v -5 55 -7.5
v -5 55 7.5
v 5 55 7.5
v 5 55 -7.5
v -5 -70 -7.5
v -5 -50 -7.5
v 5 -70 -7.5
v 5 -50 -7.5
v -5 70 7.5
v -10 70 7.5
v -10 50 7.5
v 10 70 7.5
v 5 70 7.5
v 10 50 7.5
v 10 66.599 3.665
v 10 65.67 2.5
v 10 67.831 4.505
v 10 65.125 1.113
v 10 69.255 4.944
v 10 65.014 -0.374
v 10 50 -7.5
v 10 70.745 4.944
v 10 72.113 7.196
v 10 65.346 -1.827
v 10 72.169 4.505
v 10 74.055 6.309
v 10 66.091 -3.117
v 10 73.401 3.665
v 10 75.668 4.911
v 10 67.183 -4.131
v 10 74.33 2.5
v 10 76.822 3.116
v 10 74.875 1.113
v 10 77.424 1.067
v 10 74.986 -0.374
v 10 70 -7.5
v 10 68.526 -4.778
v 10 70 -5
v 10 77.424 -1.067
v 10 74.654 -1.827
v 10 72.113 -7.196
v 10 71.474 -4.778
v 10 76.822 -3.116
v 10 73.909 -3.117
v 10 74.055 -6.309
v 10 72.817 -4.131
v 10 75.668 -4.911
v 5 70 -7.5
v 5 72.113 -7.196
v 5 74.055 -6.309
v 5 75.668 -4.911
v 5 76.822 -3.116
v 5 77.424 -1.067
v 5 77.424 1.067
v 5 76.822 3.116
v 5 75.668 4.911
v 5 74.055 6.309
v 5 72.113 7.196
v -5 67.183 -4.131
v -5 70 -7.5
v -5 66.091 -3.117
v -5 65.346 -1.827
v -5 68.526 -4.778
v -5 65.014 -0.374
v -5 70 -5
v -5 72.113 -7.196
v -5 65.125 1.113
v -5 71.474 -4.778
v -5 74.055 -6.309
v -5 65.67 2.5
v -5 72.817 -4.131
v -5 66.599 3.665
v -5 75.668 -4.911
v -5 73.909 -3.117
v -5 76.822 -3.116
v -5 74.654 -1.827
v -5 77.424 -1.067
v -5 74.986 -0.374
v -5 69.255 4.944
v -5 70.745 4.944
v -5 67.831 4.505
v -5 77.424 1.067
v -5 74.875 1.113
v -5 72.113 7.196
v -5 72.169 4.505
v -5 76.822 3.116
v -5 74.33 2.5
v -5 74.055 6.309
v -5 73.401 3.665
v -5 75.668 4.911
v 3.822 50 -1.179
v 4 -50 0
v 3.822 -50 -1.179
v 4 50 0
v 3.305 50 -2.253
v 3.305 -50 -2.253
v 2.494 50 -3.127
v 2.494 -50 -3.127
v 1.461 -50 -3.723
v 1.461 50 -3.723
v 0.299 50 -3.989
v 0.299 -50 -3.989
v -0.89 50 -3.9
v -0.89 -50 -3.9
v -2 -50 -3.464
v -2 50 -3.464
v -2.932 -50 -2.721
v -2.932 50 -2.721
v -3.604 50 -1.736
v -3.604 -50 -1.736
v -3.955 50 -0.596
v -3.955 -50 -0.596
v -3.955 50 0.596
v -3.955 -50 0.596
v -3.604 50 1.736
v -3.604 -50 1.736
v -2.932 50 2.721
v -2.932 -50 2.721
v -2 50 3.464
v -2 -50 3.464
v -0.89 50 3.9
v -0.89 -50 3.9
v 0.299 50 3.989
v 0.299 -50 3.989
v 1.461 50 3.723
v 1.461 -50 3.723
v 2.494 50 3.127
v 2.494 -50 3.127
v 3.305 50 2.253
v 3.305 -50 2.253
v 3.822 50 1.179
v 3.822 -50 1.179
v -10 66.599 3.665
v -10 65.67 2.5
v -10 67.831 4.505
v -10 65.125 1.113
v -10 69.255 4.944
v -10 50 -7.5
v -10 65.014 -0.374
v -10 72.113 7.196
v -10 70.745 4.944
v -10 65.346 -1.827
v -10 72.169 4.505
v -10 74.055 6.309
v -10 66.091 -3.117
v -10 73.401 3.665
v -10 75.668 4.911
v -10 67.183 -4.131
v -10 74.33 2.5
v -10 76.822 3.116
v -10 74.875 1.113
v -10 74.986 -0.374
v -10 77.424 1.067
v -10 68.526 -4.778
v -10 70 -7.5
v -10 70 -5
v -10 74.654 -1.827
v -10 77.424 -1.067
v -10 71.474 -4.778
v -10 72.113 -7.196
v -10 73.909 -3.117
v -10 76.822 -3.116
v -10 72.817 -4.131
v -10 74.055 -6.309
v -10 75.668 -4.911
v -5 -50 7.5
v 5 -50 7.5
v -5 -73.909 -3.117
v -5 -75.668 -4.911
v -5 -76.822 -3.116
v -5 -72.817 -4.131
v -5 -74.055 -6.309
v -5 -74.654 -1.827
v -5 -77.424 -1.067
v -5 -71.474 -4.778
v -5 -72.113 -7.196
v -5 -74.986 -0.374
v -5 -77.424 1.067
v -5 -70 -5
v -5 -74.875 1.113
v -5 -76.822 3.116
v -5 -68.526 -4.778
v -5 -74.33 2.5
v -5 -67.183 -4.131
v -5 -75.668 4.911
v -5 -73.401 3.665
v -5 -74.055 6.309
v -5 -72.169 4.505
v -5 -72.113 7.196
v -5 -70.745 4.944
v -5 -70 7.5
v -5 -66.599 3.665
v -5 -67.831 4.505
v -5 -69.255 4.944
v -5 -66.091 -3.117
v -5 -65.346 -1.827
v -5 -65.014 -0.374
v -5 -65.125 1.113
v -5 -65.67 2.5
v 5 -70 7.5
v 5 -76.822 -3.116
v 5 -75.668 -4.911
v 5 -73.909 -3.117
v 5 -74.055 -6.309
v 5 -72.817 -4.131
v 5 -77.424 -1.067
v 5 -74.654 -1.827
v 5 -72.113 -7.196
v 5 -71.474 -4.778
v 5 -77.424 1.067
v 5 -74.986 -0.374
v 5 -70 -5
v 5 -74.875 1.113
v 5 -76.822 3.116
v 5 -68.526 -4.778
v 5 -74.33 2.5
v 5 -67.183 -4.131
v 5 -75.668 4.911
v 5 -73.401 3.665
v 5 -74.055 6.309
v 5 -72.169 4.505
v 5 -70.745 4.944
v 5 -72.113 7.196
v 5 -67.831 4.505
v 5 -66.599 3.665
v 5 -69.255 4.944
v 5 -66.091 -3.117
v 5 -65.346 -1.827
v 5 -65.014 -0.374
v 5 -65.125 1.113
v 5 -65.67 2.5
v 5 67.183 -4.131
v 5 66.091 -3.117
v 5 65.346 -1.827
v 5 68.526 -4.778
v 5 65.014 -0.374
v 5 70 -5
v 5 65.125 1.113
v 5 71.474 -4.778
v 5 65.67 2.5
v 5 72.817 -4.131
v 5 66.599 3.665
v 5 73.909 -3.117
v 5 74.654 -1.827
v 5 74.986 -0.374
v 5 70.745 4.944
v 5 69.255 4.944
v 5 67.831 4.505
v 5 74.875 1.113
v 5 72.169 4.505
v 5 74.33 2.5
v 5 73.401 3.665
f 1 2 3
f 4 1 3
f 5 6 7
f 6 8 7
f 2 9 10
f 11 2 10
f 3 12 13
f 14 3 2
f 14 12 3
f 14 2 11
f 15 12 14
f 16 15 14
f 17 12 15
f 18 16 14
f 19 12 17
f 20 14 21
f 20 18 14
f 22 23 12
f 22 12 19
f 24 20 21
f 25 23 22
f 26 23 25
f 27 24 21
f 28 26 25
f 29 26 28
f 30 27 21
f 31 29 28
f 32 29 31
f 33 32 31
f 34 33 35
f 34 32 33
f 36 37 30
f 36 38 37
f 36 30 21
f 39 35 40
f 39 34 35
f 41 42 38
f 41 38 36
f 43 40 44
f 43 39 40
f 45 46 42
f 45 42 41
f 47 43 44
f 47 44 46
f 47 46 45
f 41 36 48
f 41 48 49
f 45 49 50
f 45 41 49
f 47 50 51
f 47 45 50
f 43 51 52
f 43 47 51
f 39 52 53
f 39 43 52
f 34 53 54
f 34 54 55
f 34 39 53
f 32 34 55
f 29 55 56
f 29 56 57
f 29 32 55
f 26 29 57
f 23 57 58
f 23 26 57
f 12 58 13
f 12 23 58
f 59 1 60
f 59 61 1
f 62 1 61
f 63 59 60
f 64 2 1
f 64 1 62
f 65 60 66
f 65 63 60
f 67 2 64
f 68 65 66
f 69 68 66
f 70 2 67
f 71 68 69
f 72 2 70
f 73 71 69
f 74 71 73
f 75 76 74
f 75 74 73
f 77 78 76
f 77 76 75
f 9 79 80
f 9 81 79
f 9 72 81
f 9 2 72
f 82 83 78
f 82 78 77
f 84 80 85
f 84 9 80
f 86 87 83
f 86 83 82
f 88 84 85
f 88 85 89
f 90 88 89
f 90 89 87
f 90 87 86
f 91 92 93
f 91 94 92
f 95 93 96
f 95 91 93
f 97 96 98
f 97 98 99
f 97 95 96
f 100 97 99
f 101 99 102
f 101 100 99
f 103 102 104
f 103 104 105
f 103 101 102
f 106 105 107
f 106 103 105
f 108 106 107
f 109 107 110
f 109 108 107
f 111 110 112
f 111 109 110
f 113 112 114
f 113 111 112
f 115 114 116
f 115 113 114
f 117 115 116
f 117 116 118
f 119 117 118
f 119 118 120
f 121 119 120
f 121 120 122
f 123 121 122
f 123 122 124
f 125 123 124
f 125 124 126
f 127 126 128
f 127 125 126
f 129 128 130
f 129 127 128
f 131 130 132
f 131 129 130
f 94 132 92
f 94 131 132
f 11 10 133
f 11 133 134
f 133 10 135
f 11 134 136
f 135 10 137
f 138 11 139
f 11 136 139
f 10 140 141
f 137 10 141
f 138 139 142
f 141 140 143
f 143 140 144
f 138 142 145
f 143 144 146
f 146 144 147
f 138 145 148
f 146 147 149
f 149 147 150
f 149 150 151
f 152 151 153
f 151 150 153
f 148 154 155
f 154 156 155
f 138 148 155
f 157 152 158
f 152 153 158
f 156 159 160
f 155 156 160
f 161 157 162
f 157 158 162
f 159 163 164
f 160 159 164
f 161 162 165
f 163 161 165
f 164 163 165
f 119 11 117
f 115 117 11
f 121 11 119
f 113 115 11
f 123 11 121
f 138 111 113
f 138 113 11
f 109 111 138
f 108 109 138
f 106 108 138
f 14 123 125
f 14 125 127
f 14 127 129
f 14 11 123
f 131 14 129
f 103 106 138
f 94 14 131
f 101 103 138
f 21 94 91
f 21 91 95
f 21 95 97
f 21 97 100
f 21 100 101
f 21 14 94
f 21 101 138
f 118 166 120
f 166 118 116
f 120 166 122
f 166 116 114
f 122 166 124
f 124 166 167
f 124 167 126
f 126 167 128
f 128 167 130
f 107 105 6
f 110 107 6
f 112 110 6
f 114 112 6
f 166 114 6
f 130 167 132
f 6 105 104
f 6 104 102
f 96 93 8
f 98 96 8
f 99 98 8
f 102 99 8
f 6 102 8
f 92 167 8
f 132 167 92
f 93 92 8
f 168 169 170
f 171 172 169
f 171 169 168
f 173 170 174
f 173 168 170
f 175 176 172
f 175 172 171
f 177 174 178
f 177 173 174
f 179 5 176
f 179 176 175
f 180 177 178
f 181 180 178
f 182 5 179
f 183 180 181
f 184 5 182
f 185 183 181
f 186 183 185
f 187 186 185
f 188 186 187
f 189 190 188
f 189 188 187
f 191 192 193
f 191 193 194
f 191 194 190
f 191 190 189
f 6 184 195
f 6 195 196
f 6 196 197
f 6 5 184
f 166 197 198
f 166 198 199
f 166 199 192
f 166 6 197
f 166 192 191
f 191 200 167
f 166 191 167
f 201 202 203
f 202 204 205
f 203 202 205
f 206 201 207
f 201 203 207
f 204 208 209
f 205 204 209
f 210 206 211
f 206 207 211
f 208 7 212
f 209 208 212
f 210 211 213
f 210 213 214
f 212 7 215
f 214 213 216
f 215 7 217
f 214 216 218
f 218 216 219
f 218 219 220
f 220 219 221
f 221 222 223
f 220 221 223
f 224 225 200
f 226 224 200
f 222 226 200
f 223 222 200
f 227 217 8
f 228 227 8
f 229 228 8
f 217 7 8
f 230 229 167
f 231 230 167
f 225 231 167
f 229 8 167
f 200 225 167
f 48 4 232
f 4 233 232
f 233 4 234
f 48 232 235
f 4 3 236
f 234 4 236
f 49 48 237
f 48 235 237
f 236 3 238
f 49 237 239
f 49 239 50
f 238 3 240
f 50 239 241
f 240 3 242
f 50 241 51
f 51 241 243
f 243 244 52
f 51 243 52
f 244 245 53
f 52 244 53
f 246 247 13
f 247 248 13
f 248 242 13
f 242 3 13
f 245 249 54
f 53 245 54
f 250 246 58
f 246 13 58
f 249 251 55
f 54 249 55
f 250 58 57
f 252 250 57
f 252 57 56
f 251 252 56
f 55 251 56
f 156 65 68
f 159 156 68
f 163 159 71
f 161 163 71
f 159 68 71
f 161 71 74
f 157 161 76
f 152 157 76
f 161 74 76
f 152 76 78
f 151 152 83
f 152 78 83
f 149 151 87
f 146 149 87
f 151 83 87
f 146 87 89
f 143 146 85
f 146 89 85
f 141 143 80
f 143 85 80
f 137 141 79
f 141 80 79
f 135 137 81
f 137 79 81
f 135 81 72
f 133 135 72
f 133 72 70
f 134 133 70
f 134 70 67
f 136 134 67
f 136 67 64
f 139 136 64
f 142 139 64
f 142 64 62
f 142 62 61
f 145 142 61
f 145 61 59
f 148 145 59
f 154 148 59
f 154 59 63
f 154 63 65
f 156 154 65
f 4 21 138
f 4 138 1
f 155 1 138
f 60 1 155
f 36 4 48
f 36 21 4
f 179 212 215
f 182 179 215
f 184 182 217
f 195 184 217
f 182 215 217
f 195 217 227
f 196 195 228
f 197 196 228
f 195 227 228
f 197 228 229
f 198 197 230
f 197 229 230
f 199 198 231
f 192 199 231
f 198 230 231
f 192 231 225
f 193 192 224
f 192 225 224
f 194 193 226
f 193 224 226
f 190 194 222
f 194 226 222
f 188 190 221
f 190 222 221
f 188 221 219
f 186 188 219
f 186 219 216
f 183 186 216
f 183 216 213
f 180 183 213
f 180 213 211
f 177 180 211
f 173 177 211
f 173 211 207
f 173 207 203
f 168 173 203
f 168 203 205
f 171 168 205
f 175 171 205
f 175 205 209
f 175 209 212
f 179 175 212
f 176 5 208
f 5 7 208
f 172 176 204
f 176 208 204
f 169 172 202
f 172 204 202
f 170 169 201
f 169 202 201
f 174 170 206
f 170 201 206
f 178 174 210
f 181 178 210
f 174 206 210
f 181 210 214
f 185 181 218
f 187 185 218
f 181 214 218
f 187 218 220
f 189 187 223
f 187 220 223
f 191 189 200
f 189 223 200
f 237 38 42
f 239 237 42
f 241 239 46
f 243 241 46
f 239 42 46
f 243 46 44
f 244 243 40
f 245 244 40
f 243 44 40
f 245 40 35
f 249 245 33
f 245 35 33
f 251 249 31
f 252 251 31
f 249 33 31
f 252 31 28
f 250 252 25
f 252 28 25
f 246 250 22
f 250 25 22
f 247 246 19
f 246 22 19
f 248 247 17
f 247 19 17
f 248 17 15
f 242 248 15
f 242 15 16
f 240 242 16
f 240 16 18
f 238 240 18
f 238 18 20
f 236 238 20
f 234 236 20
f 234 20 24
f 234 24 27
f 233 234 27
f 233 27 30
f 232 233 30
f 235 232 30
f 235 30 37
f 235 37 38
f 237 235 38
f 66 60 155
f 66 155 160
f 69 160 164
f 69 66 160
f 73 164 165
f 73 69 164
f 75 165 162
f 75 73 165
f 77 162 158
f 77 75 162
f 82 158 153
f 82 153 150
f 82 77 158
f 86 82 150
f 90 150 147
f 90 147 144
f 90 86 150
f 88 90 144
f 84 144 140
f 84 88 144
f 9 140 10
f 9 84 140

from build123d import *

# Parameters (mm, degrees)
SKETCH1_R           = 4
BOSS_EXTRUDE1_DEPTH = 50
BOSS_EXTRUDE2_DEPTH = 10
SKETCH3_R           = 5
CUT_EXTRUDE1_DEPTH  = 21
SKETCH4_W           = 10
SKETCH4_H           = 22.5
CUT_EXTRUDE2_DEPTH  = 16
BOSS_EXTRUDE3_DEPTH = 5
SKETCH6_R           = 5
CUT_EXTRUDE3_DEPTH  = 20


with BuildPart() as part:
    # Sketch1 → Boss-Extrude1 (new body, symmetric)
    with BuildSketch(Plane(origin=(0, 0, 0), x_dir=(1, 0, 0), z_dir=(0, 1, 0))):
        Circle(SKETCH1_R)
    extrude(amount=BOSS_EXTRUDE1_DEPTH, both=True)

    # Sketch2 → Boss-Extrude2 (add, symmetric)
    with BuildSketch(Plane(origin=(0, 0, 0), x_dir=(0, 0, -1), z_dir=(1, 0, 0))):
        with BuildLine():
            Line((0, 50), (7.5, 50))
            Line((7.5, 50), (7.5, 70))
            ThreePointArc((7.5, 70), (0, 77.5), (-7.5, 70))
            Line((-7.5, 70), (-7.5, 50))
            Line((-7.5, 50), (0, 50))
        make_face()
    extrude(amount=BOSS_EXTRUDE2_DEPTH, both=True)

    # Sketch3 → Cut-Extrude1 (cut, through all)
    with BuildSketch(Plane(origin=(10, 0, 0), x_dir=(0, 0, -1), z_dir=(1, 0, 0))):
        with Locations((0, 70)):
            Circle(SKETCH3_R)
    extrude(amount=-CUT_EXTRUDE1_DEPTH, mode=Mode.SUBTRACT)

    # Sketch4 → Cut-Extrude2 (cut, through all)
    with BuildSketch(Plane.XY.offset(7.5)):
        with Locations((0, 66.25)):
            Rectangle(SKETCH4_W, SKETCH4_H)
    extrude(amount=-CUT_EXTRUDE2_DEPTH, mode=Mode.SUBTRACT)

    # Sketch5 → Boss-Extrude3 (add, symmetric)
    with BuildSketch(Plane(origin=(0, 0, 0), x_dir=(0, 0, -1), z_dir=(1, 0, 0))):
        with BuildLine():
            Line((-7.5, -50), (7.5, -50))
            Line((7.5, -50), (7.5, -70))
            ThreePointArc((7.5, -70), (0, -77.5), (-7.5, -70))
            Line((-7.5, -70), (-7.5, -50))
        make_face()
    extrude(amount=BOSS_EXTRUDE3_DEPTH, both=True)

    # Sketch6 → Cut-Extrude3 (cut)
    with BuildSketch(Plane(origin=(5, 0, 0), x_dir=(0, 0, -1), z_dir=(1, 0, 0))):
        with Locations((0, -70)):
            Circle(SKETCH6_R)
    extrude(amount=-CUT_EXTRUDE3_DEPTH, mode=Mode.SUBTRACT)


solid = part.part
